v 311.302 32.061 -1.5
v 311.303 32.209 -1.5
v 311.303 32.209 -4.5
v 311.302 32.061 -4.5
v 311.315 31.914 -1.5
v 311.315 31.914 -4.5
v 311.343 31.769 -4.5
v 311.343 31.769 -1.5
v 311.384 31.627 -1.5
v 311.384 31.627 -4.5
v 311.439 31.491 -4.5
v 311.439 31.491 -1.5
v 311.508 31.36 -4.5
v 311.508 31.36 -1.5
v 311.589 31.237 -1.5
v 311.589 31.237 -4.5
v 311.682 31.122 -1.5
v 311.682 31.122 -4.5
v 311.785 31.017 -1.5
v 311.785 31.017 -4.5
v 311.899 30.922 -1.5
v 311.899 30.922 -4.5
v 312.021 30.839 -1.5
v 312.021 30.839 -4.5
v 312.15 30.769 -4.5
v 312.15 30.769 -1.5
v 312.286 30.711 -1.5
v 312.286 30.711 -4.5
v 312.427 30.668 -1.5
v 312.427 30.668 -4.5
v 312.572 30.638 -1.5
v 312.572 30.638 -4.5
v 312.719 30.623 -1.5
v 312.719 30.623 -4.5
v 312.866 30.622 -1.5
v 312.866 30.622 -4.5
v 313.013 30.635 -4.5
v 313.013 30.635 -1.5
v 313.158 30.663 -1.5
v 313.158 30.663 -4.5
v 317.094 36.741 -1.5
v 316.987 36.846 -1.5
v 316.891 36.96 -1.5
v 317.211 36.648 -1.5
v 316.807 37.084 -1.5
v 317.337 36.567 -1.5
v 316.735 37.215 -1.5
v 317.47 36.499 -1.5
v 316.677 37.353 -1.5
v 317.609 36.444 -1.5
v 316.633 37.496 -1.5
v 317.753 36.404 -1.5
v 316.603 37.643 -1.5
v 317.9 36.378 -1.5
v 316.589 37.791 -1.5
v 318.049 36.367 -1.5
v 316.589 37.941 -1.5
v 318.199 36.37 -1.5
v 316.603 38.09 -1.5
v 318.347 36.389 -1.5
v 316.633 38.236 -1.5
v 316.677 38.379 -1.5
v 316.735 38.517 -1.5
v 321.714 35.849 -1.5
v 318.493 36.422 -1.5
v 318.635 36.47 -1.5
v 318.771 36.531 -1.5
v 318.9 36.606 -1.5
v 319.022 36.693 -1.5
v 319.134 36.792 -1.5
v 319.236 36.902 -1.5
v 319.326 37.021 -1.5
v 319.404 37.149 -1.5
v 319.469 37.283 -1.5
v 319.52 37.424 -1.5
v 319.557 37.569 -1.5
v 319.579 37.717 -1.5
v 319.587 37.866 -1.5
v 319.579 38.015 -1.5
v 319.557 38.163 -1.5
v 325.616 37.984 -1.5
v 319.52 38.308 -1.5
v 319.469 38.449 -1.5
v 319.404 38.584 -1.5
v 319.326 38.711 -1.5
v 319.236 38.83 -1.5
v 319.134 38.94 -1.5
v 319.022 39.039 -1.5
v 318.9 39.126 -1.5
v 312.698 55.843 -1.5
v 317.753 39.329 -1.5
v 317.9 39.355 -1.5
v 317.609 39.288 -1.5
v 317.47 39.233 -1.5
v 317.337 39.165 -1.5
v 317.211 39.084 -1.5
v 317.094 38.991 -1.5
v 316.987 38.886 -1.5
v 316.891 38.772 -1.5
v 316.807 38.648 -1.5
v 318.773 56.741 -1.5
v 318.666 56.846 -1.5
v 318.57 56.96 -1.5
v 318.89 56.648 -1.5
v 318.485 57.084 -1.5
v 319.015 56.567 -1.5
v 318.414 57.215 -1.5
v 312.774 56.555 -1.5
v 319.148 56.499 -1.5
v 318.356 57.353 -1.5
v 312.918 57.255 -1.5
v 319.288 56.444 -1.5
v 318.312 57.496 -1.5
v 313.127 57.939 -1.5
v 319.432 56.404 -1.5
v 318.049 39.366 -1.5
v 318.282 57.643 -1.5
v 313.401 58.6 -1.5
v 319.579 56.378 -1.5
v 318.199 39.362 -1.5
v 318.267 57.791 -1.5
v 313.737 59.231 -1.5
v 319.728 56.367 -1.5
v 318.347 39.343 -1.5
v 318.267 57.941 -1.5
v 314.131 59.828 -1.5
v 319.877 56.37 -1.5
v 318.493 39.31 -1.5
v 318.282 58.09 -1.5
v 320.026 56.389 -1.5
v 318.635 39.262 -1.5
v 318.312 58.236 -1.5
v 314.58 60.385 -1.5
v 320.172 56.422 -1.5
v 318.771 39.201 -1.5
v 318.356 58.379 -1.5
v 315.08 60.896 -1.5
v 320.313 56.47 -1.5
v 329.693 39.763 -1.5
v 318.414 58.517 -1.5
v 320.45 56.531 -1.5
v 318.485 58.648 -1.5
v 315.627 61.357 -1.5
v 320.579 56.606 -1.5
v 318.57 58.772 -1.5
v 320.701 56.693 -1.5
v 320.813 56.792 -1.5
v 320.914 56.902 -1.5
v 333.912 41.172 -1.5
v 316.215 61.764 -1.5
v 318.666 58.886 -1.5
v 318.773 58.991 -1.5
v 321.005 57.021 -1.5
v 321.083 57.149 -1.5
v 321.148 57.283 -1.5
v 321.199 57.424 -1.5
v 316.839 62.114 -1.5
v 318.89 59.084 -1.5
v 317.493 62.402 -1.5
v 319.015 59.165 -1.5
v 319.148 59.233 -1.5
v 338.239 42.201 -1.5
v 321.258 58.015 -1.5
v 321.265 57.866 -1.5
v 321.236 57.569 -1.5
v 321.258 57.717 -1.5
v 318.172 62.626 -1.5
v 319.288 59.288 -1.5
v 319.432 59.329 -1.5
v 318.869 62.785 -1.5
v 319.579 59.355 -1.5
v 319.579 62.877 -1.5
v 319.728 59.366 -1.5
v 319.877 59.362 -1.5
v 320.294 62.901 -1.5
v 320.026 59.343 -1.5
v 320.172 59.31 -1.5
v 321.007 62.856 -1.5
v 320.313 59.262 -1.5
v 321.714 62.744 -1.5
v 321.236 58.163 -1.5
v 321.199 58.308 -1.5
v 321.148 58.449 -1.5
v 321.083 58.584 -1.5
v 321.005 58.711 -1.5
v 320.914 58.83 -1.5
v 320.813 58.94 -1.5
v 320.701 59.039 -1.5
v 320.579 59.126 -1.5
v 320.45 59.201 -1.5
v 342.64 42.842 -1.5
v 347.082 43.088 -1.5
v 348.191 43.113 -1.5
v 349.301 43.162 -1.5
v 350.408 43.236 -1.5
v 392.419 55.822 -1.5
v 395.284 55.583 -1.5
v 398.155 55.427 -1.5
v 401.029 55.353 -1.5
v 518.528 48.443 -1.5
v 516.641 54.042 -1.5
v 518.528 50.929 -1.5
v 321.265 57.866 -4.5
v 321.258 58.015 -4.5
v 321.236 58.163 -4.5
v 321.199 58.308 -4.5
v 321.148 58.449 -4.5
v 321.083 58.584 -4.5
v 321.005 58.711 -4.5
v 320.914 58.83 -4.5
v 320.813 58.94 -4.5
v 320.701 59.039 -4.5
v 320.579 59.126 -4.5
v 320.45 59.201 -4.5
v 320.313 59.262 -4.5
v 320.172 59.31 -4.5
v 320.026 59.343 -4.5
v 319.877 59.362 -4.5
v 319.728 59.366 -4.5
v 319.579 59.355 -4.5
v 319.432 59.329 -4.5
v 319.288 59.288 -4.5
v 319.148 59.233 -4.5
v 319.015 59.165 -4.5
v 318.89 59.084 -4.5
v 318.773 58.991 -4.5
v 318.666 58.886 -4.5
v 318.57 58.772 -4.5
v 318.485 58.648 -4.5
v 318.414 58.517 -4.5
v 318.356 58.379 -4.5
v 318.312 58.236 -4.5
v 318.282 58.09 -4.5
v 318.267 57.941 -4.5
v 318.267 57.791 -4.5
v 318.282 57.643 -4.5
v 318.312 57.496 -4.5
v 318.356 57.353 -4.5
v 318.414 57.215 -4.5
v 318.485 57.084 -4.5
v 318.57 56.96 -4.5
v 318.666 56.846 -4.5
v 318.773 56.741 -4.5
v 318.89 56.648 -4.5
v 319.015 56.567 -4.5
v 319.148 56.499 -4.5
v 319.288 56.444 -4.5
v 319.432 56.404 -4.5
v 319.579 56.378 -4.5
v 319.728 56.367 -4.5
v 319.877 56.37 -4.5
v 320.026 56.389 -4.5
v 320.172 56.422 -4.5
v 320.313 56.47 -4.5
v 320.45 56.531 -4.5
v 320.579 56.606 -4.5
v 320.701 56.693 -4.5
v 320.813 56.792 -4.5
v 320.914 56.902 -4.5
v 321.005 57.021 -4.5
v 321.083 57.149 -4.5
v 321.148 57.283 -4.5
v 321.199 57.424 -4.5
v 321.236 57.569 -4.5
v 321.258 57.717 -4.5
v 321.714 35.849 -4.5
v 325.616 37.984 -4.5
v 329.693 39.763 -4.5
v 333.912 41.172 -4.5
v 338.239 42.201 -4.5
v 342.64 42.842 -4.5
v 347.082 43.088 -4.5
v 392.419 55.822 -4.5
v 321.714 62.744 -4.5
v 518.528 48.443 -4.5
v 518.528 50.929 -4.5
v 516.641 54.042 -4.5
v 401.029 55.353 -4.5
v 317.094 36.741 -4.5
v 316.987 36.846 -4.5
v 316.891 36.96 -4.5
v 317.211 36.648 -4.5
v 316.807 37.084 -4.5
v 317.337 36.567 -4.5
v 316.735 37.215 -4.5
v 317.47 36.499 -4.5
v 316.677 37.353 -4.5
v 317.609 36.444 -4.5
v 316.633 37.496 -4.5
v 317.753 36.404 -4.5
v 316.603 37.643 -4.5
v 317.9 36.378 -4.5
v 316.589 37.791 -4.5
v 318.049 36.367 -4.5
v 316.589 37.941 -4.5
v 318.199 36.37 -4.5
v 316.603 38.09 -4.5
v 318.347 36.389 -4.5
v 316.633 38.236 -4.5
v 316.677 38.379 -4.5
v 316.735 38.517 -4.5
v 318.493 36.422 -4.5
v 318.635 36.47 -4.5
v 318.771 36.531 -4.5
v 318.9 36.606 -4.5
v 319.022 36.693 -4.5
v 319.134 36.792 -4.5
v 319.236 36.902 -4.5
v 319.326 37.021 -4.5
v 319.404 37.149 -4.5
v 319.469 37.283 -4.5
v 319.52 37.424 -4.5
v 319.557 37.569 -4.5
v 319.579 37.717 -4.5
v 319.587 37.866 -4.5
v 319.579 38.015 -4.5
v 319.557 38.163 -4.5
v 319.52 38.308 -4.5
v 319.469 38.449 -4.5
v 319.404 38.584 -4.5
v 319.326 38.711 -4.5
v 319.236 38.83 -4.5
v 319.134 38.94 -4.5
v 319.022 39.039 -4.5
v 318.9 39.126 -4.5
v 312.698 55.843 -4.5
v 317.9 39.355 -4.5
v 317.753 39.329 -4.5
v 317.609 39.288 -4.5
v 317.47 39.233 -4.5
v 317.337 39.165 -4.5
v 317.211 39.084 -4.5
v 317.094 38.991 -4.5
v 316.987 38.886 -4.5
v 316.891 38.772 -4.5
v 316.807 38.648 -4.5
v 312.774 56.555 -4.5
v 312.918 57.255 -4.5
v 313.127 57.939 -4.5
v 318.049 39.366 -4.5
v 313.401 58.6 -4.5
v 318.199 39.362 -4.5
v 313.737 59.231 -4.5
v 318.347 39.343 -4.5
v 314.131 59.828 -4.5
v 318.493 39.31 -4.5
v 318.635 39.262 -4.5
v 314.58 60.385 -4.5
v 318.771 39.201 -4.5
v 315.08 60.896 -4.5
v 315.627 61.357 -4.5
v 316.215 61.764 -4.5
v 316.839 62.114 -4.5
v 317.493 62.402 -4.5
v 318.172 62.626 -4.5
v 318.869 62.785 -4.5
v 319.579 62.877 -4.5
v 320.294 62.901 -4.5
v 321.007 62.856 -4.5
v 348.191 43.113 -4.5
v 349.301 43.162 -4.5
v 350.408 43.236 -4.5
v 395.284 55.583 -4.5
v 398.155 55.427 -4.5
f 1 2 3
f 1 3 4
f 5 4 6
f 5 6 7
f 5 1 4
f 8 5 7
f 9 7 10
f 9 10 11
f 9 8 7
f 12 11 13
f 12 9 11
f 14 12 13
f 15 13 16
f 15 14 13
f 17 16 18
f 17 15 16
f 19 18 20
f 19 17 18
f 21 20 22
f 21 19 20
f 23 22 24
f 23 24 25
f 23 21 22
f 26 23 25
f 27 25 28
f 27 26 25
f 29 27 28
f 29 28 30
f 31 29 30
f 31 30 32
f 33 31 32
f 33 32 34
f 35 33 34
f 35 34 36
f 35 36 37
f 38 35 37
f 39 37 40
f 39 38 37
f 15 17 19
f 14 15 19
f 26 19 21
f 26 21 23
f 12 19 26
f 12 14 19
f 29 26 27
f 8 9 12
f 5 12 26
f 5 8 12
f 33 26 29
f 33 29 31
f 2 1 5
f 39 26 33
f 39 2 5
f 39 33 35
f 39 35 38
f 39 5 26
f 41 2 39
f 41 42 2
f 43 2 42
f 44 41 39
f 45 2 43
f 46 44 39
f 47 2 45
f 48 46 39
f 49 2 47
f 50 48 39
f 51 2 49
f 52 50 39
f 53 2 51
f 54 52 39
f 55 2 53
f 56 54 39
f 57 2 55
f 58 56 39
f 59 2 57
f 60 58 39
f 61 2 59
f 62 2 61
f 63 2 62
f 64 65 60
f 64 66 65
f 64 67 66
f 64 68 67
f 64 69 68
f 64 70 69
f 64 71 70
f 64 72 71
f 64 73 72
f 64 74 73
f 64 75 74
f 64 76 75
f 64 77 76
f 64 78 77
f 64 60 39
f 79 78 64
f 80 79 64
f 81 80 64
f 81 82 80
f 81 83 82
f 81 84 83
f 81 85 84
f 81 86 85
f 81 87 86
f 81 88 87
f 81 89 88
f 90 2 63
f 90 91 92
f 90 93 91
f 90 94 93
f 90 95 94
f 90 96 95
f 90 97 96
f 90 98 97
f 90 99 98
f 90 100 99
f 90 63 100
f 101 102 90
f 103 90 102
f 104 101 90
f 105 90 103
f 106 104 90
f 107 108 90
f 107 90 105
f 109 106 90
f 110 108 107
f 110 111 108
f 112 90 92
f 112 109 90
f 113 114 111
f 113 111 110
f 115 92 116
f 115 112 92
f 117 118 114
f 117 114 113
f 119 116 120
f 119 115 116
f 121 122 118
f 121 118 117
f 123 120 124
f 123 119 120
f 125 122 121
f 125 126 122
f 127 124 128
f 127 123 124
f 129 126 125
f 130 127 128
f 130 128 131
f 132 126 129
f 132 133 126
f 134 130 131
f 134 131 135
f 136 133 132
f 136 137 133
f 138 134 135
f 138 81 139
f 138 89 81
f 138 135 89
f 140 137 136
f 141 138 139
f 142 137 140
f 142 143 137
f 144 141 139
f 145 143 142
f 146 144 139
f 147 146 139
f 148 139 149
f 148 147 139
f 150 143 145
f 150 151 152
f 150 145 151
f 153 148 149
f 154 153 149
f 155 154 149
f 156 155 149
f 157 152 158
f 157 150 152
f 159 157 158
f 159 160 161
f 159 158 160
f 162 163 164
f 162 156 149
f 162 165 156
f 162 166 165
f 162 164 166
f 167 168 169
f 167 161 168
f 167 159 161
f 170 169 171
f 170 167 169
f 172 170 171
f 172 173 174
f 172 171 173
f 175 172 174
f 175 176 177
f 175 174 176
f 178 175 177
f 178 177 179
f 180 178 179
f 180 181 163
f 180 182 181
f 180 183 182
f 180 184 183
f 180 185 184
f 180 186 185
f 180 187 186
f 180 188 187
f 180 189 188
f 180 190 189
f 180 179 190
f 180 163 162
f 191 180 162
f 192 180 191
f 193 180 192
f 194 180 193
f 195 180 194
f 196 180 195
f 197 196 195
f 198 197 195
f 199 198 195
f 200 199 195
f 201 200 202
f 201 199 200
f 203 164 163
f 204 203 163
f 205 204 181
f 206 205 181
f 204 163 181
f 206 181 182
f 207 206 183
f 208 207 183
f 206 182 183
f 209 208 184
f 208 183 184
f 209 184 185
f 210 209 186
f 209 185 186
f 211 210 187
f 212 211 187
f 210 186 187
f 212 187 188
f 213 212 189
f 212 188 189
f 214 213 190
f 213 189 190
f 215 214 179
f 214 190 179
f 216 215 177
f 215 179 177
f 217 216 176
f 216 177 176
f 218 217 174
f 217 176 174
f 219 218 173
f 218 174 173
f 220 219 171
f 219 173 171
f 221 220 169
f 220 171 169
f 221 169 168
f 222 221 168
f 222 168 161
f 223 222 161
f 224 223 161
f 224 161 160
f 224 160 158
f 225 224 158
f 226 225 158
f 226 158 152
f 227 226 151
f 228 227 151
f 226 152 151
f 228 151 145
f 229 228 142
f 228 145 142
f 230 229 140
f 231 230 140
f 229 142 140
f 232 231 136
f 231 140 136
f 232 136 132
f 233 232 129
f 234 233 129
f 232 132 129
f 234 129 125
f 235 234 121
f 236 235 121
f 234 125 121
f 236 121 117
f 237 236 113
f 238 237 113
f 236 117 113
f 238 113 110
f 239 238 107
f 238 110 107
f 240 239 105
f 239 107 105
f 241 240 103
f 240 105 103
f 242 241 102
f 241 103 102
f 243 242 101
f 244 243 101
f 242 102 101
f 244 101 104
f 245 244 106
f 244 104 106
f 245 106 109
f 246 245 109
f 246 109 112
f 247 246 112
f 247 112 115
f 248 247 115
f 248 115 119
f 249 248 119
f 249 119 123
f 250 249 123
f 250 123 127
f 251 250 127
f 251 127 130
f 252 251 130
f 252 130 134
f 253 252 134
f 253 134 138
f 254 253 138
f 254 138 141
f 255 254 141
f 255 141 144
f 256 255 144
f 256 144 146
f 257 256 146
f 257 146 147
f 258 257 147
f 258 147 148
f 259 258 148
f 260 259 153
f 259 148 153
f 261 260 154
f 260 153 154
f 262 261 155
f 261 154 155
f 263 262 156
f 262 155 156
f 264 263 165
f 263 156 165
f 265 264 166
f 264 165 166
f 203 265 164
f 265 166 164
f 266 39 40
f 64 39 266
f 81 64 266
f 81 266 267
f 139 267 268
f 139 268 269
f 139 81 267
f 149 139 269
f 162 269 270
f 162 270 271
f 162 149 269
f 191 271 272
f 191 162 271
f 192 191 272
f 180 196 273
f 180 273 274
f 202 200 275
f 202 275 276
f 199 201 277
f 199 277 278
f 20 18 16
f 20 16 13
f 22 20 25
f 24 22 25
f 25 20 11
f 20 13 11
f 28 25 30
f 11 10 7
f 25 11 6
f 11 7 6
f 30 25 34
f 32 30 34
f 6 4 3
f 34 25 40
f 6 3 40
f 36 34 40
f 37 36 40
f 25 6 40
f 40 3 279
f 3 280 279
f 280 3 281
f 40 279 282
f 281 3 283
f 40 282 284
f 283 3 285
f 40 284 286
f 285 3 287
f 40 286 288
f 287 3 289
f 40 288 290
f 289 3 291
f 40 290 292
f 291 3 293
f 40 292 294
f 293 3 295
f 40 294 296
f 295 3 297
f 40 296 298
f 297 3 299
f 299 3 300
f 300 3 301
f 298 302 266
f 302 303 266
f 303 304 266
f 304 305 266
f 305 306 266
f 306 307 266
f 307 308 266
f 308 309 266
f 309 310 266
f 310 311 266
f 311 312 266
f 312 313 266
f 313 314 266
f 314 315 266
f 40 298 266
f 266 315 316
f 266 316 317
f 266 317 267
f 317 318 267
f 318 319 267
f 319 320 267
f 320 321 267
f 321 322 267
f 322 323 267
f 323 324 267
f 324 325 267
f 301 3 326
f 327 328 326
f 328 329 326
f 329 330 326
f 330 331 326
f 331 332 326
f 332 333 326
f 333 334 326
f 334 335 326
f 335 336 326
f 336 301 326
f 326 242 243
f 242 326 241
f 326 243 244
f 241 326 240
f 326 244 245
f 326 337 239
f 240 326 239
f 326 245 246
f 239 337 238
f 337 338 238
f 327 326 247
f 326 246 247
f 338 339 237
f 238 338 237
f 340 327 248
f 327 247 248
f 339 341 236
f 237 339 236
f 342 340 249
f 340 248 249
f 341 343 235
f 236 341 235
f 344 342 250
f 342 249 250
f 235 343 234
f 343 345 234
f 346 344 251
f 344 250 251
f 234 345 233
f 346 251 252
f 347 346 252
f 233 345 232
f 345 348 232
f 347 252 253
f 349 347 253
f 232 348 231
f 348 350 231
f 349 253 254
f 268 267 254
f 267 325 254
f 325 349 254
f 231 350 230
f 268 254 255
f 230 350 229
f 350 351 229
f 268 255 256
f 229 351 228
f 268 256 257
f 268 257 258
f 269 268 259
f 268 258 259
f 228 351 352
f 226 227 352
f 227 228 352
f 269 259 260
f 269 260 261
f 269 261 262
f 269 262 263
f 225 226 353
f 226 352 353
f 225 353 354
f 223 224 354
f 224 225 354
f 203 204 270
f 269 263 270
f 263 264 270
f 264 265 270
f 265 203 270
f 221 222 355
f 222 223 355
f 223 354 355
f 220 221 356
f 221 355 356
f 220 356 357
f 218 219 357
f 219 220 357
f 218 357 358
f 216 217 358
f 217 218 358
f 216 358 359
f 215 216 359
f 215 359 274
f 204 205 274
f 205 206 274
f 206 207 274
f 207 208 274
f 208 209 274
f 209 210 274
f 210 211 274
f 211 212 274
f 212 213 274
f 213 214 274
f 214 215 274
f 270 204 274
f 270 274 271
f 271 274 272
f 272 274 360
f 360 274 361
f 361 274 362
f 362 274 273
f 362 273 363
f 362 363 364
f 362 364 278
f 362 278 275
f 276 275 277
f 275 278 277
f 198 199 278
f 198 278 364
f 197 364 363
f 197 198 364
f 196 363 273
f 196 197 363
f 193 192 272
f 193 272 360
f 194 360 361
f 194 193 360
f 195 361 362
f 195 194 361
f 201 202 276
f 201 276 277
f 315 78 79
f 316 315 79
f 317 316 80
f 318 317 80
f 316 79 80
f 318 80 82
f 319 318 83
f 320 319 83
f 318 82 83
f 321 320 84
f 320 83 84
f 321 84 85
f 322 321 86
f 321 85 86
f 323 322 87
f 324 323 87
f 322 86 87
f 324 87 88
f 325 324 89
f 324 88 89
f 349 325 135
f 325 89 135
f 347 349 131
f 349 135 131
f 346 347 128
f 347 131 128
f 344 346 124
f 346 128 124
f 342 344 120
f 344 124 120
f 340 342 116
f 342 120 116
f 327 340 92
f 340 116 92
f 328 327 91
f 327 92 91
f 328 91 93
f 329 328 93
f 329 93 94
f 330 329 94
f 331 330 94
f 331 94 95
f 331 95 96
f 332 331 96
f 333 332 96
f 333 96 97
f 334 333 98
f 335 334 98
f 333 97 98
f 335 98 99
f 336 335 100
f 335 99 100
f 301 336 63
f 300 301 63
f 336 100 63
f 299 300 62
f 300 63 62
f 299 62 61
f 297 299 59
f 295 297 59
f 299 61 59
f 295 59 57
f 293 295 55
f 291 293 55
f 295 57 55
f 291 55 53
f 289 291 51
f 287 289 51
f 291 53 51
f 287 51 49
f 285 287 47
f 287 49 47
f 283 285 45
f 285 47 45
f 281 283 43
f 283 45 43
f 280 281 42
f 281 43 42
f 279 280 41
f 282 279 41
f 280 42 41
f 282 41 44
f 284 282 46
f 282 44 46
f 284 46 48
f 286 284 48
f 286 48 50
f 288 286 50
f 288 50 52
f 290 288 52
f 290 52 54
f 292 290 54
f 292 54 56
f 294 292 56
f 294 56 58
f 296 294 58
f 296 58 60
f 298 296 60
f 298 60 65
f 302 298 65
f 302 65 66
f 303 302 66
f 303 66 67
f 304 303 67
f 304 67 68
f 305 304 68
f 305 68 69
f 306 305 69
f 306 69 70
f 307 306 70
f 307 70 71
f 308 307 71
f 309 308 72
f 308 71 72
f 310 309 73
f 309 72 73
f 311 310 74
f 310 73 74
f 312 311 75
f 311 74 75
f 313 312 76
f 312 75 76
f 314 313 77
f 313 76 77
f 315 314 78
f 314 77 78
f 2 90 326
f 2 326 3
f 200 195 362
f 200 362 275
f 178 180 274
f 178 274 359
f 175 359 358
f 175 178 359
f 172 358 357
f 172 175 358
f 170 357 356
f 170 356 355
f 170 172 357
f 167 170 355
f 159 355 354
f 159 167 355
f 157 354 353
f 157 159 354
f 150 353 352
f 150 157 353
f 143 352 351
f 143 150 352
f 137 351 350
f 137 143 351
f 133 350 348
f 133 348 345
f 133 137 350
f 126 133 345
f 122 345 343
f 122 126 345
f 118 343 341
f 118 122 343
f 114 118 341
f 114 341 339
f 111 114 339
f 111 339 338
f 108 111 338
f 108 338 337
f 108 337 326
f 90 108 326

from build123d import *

# Parameters (mm, degrees)
SKETCH1_R           = 3
BOSS_EXTRUDE3_DEPTH = 6
SCALE1_SCALE        = 0.5


with BuildPart() as part:
    # Sketch1 → Boss-Extrude3 (new body)
    with BuildSketch(Plane.XY):
        with BuildLine():
            Line((236.346486318, 61.328001261), (233.557157529, 14.05846688))
            ThreePointArc((233.557157529, 14.05846688), (234.631574503, 11.576933684), (237.266269116, 10.968030468))
            Line((237.266269116, 10.968030468), (254.377513225, 21.340067299))
            ThreePointArc((254.377513225, 21.340067299), (278.773329443, 31.985318101), (305.113217886, 35.817744276))
            ThreePointArc((305.113217886, 35.817744276), (308.442395565, 35.909839099), (311.76666015, 36.112744111))
            Line((311.76666015, 36.112744111), (648.006438707, 46.528011178))
            Line((648.006438707, 46.528011178), (648.006438707, 51.498330229))
            Line((648.006438707, 51.498330229), (644.232143491, 57.724965154))
            Line((644.232143491, 57.724965154), (413.007588136, 60.346556463))
            ThreePointArc((413.007588136, 60.346556463), (404.387645707, 60.630259841), (395.787949399, 61.285331218))
            Line((395.787949399, 61.285331218), (254.377513225, 75.129575697))
            ThreePointArc((254.377513225, 75.129575697), (242.203210075, 72.35558012), (236.346486318, 61.328001261))
        make_face()
        with Locations((250.480867538, 65.373411048)):
            Circle(SKETCH1_R, mode=Mode.SUBTRACT)
        with Locations((247.123521652, 25.373411048)):
            Circle(SKETCH1_R, mode=Mode.SUBTRACT)
    extrude(amount=-BOSS_EXTRUDE3_DEPTH)


with BuildPart() as part_1:
    # Scale1: scaled about (389.049818366, 50.358874463, -3)
    add(part.part.scale(SCALE1_SCALE).moved(Location((194.524909183, 25.179437231, -1.5))))


solid = part_1.part
